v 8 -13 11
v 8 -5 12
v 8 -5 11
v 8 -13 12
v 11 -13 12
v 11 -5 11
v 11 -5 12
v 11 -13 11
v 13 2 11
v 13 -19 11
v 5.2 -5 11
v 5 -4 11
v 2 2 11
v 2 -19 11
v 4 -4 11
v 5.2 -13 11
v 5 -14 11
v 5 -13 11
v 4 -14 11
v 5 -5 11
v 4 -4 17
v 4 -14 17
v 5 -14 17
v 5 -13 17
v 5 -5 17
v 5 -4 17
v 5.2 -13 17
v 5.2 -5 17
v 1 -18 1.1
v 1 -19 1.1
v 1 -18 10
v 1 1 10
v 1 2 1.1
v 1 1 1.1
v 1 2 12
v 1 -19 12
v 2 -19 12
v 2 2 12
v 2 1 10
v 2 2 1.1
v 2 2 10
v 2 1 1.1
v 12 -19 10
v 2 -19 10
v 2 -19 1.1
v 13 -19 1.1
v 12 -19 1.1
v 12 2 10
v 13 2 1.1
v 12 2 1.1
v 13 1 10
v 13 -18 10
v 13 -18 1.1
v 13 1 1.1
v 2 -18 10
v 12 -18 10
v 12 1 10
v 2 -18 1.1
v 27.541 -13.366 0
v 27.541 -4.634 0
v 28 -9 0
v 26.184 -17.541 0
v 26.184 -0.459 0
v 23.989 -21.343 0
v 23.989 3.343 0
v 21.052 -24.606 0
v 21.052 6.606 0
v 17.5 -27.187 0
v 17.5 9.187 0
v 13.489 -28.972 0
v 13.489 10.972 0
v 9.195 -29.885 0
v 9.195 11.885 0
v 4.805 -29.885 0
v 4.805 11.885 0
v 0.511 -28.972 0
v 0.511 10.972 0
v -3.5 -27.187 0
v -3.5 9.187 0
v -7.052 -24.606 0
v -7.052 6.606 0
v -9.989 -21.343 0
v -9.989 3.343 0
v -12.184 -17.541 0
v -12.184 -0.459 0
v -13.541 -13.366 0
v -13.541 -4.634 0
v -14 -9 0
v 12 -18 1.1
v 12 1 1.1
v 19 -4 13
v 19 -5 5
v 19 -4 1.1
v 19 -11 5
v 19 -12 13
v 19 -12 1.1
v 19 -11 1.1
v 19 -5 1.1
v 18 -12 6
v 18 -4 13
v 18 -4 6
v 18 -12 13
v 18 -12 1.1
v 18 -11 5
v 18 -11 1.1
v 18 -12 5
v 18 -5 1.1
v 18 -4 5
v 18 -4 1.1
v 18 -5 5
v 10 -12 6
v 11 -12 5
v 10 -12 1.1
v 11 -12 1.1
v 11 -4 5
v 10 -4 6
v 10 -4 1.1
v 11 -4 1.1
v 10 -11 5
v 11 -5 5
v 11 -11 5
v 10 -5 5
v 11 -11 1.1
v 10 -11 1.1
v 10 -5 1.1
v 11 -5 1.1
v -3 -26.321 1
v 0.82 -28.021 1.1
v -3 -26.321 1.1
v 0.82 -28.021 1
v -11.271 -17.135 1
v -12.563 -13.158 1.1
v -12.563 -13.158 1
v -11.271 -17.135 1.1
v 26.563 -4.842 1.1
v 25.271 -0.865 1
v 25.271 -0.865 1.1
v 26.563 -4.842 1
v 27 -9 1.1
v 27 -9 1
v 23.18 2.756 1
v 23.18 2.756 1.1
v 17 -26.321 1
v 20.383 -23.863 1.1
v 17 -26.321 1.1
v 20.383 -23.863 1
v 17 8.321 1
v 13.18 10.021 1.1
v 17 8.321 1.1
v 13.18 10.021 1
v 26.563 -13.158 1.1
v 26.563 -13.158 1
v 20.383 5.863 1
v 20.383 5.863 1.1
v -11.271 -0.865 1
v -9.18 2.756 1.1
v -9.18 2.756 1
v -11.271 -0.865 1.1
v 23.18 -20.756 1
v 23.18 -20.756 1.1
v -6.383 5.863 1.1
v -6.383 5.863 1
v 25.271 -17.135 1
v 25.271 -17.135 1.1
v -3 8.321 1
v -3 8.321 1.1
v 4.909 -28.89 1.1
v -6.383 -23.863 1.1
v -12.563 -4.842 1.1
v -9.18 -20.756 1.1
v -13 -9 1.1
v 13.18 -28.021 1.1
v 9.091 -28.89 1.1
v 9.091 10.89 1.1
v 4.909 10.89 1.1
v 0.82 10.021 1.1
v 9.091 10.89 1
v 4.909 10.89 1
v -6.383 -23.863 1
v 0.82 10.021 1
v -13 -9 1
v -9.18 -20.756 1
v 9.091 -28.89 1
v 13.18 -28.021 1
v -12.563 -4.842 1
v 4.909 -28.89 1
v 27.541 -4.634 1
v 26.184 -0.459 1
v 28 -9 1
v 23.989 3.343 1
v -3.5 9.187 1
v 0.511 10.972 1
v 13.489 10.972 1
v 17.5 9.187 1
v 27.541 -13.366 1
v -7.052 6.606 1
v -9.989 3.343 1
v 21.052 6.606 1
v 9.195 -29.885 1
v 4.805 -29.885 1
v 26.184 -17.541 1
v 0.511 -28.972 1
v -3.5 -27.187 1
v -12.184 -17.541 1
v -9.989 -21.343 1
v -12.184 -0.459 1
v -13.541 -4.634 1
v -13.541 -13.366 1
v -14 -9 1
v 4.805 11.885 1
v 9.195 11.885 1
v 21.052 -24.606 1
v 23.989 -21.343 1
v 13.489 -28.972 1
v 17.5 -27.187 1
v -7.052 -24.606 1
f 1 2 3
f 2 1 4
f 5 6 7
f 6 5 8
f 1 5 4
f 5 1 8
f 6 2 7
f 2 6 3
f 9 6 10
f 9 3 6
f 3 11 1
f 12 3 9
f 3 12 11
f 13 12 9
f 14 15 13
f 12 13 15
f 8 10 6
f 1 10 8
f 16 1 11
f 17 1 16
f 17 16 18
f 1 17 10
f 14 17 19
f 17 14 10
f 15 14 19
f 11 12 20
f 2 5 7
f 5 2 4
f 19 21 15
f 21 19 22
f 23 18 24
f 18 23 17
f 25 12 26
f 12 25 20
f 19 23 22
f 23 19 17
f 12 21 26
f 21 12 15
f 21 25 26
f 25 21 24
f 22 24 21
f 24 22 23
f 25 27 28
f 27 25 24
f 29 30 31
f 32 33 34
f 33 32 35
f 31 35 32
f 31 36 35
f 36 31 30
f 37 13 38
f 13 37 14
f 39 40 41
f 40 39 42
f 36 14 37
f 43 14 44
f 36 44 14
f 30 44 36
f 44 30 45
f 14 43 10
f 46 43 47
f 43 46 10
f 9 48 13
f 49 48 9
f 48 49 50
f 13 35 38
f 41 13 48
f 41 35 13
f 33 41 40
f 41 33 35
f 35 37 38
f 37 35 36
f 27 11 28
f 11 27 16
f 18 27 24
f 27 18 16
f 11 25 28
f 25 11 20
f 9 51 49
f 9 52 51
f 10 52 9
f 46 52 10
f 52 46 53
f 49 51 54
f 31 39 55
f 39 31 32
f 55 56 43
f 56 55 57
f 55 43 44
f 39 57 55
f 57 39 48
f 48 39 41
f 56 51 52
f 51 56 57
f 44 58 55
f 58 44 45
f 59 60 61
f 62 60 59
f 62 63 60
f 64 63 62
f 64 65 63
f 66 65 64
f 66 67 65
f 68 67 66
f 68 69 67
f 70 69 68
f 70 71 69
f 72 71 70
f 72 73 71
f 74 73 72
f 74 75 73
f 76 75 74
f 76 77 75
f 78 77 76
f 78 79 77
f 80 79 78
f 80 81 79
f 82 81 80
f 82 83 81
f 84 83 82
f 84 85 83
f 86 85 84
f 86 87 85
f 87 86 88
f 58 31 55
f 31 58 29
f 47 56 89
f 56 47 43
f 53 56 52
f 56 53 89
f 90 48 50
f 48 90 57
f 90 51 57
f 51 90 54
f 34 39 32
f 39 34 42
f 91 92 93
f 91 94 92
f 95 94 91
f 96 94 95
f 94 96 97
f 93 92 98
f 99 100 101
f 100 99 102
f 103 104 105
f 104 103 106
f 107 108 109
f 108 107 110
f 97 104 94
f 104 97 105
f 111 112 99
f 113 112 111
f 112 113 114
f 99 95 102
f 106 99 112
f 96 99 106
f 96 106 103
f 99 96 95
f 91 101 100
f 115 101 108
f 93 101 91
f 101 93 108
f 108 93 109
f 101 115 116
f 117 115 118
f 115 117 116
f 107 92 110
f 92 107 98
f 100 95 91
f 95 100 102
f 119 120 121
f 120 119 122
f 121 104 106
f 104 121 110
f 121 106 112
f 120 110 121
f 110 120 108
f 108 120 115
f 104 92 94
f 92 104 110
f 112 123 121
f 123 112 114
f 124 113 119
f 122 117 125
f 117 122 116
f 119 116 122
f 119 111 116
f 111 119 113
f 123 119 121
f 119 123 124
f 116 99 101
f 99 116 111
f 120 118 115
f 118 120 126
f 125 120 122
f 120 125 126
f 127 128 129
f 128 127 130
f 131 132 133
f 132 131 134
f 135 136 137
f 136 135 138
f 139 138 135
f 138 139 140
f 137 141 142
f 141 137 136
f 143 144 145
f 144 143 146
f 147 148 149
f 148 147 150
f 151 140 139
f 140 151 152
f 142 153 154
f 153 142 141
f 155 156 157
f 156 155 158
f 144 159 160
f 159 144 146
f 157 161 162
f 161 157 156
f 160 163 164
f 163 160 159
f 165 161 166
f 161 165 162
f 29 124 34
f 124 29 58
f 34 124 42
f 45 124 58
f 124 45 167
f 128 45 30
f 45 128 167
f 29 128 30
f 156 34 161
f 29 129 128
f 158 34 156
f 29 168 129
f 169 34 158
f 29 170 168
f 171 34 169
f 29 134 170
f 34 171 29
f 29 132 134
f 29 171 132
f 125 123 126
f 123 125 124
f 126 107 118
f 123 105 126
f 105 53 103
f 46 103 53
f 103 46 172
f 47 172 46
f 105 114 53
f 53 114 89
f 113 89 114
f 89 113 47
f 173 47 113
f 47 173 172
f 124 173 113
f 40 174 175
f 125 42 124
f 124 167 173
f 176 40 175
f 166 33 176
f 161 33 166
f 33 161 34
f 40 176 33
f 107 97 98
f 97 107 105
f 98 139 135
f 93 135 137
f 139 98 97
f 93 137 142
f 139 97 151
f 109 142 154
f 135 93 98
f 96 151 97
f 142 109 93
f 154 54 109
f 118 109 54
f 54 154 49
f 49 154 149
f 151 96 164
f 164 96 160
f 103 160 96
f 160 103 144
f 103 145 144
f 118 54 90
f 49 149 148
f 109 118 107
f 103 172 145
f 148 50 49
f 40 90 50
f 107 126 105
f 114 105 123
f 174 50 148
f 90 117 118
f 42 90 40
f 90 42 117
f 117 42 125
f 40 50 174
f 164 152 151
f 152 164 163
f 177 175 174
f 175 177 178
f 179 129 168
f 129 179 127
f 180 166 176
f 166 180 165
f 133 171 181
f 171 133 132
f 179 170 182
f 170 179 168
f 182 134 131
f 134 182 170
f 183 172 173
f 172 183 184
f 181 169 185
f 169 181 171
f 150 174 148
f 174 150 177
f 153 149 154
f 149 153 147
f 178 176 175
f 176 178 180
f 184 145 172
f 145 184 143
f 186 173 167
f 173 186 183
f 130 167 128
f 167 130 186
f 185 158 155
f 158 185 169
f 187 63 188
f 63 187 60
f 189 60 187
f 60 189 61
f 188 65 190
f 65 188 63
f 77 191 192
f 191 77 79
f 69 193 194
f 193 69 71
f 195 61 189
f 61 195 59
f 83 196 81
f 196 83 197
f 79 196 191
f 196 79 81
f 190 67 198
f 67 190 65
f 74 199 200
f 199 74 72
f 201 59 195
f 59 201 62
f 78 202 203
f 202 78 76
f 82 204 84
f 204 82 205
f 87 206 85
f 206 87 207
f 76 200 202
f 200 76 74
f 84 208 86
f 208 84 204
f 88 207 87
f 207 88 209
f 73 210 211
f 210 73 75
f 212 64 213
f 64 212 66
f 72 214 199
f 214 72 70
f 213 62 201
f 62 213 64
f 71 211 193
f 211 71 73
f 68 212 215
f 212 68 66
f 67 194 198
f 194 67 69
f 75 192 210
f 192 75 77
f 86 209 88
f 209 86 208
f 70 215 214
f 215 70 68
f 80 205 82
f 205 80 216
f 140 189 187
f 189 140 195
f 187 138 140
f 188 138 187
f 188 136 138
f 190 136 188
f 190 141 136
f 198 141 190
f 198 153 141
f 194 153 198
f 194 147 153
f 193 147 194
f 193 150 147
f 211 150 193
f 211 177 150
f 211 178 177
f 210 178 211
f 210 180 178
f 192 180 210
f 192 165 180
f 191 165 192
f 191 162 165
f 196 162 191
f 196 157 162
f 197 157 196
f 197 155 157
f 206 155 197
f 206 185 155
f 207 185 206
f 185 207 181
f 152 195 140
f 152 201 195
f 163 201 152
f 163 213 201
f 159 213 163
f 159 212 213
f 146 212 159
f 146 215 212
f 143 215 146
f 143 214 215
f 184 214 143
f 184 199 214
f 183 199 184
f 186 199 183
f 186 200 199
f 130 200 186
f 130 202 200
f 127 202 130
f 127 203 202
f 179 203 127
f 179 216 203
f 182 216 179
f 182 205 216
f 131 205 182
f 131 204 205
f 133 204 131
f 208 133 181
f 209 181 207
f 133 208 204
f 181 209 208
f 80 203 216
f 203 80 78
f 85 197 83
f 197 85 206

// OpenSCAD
//!OpenSCAD




color([0.4,0.4,0.4]) {
  rotate([90, 0, 0]){
    translate([8, 11, 5]){
      cube([3, 1, 8], center=false);
    }
  }
}
color([1,1,0]) {
  rotate([90, 0, 0]){
    translate([4, 11, 4]){
      cube([1, 6, 10], center=false);
    }
  }
}
color([0.6,0.6,0.6]) {
  rotate([90, 0, 0]){
    translate([1, 11, -2]){
      cube([1, 1, 21], center=false);
    }
  }
}
color([1,1,0]) {
  rotate([90, 0, 0]){
    translate([5, 11, 5]){
      cube([0.2, 1, 8], center=false);
    }
  }
}
color([0.4,0.4,0.4]) {
  rotate([90, 0, 0]){
    translate([5, 11, 5]){
      cube([0.2, 6, 8], center=false);
    }
  }
}
color([0.6,0.6,0.6]) {
  rotate([90, 0, 0]){
    translate([1, 10, -2]){
      cube([12, 1, 21], center=false);
    }
  }
}
color([1,1,0]) {
  translate([1, -19, 0]){
    cube([1, 1, 11], center=false);
  }
}
color([1,1,0]) {
  translate([12, -19, 0]){
    cube([1, 1, 11], center=false);
  }
}
color([1,1,0]) {
  translate([12, 1, 0]){
    cube([1, 1, 10], center=false);
  }
}
color([1,1,0]) {
  translate([1, 1, 0]){
    cube([1, 1, 11], center=false);
  }
}
color([1,1,0]) {
  translate([18, -12, 0]){
    cube([1, 1, 8], center=false);
  }
}
color([1,1,0]) {
  translate([18, -5, 0]){
    cube([1, 1, 8], center=false);
  }
}
color([1,1,0]) {
  translate([18, -12, 5]){
    cube([1, 8, 8], center=false);
  }
}
color([1,1,0]) {
  translate([10, -12, 0]){
    cube([1, 1, 5], center=false);
  }
}
color([0.6,0.6,0.6]) {
  translate([18, -12, 5]){
    rotate([0, 270, 0]){
      cube([1, 8, 8], center=false);
    }
  }
}
color([1,1,0]) {
  translate([10, -5, 0]){
    cube([1, 1, 6], center=false);
  }
}
color([0.75,0.75,0.75]) {
  translate([7, -9, 0]){
    cylinder(r1=20, r2=20, h=1.1, center=false);
  }
}
color([1,1,0]) {
  translate([7, -9, 0]){
    cylinder(r1=21, r2=21, h=1, center=false);
  }
}
